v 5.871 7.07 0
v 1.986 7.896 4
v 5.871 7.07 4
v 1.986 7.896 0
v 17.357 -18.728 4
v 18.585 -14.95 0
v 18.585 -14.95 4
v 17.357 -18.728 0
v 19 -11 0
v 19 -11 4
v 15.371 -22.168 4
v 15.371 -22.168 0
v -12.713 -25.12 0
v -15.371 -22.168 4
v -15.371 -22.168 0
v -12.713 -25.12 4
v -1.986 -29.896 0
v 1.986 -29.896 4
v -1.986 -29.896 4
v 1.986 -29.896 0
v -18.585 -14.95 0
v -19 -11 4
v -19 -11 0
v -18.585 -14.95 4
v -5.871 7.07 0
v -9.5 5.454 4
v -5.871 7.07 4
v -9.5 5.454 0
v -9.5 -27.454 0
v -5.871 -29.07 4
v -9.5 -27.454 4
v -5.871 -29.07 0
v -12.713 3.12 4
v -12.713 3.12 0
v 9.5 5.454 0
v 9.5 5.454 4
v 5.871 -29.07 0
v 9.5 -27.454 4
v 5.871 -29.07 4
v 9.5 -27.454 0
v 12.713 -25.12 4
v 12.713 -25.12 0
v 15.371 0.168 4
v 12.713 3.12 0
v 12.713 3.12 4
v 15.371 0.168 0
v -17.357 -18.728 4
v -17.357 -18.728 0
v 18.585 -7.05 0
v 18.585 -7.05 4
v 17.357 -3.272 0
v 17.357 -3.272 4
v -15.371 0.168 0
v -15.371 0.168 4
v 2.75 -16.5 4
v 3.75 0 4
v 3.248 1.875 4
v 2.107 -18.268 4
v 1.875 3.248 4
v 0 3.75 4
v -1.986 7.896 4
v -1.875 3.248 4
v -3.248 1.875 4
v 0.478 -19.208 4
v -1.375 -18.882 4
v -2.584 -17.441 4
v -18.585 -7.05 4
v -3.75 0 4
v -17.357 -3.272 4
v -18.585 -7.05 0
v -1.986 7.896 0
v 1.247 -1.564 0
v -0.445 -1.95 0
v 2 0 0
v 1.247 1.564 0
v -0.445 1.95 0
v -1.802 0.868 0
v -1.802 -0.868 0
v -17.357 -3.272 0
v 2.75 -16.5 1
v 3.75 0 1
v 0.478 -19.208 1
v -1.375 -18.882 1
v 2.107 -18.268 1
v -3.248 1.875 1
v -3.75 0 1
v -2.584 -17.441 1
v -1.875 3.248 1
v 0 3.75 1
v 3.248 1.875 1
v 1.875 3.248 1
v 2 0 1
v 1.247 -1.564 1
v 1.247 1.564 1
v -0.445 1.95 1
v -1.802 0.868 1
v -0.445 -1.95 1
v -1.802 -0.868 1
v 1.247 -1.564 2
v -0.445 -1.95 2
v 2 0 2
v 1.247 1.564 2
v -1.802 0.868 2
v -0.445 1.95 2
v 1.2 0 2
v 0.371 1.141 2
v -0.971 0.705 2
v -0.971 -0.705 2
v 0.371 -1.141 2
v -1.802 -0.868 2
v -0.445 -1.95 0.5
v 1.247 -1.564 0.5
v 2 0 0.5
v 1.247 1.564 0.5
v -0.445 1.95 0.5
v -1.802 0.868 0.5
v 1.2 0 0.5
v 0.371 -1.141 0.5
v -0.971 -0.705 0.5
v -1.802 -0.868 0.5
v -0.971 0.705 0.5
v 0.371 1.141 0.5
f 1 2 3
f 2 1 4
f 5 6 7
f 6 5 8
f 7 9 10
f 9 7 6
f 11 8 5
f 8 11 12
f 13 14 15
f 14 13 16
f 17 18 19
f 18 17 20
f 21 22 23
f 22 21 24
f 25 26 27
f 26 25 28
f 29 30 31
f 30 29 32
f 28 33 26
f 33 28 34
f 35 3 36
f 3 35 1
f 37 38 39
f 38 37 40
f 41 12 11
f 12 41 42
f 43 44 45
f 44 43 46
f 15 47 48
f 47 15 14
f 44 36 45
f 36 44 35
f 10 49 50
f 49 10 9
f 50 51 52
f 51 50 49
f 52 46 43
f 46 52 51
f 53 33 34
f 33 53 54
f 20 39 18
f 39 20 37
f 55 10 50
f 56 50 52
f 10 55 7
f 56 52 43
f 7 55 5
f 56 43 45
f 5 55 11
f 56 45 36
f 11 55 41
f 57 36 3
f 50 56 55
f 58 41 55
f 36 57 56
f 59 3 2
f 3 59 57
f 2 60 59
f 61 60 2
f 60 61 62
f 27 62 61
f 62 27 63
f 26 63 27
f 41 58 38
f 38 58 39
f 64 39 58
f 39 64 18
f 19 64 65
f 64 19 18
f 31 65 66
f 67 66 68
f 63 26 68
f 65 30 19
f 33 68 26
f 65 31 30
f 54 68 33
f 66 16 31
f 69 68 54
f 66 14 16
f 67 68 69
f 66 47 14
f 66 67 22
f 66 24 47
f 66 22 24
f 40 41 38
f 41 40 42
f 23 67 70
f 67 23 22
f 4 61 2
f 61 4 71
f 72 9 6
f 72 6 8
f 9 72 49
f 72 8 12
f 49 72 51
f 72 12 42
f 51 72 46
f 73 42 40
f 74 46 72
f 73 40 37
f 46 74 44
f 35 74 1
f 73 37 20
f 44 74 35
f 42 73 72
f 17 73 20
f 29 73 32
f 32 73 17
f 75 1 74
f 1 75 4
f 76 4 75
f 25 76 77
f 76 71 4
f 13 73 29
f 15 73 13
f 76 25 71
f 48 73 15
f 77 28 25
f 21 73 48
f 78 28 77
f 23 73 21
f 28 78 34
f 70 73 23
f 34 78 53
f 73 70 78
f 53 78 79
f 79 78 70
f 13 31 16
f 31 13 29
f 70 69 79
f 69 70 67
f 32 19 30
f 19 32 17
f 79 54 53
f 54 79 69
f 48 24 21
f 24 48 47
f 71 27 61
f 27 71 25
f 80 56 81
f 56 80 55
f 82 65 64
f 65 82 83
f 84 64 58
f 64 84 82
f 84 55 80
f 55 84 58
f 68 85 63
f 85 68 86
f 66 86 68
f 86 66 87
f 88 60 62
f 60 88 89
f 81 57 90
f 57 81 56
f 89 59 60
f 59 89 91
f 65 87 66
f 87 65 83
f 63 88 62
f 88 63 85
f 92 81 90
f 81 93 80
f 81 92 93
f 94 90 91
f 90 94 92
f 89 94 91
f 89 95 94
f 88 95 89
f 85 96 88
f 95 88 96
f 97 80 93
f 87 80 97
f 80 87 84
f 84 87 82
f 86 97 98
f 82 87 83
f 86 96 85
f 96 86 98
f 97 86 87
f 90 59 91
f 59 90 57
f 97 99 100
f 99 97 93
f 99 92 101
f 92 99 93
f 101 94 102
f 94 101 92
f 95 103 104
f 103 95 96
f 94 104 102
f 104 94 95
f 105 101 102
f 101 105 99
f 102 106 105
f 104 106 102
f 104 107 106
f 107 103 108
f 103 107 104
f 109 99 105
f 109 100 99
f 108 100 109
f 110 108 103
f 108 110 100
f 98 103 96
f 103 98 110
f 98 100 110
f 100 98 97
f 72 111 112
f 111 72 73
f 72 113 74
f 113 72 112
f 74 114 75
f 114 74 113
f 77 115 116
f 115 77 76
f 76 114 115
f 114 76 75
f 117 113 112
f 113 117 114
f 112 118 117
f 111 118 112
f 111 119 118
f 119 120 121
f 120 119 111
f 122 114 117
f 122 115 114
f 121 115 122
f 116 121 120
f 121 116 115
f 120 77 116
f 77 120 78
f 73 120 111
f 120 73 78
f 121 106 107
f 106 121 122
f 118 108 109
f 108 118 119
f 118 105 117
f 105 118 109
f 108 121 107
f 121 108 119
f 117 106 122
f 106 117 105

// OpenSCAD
translate(v = [0, 0, 4.0]) {
	rotate(a = [180, 0, 0]) {
		difference() {
			union() {
				difference() {
					translate(v = [0, 11.0, 0]) {
						cylinder(d = 38.0, h = 4.0);
					}
					translate(v = [0, 0, -0.1]) {
						hull() {
							cylinder(d = 7.5, h = 3.1);
							translate(v = [0, 16.5, 0]) {
								cylinder(d = 5.5, h = 3.1);
							}
						}
					}
				}
				translate(v = [0, 0, 2.0]) {
					cylinder(d = 4.0, h = 1.1);
				}
			}
			translate(v = [0, 0, 3.5]) {
				cylinder(d = 4.0, h = 1.0);
			}
			translate(v = [0, 0, -1]) {
				cylinder(d = 2.4, h = 6.0);
			}
		}
	}
}
